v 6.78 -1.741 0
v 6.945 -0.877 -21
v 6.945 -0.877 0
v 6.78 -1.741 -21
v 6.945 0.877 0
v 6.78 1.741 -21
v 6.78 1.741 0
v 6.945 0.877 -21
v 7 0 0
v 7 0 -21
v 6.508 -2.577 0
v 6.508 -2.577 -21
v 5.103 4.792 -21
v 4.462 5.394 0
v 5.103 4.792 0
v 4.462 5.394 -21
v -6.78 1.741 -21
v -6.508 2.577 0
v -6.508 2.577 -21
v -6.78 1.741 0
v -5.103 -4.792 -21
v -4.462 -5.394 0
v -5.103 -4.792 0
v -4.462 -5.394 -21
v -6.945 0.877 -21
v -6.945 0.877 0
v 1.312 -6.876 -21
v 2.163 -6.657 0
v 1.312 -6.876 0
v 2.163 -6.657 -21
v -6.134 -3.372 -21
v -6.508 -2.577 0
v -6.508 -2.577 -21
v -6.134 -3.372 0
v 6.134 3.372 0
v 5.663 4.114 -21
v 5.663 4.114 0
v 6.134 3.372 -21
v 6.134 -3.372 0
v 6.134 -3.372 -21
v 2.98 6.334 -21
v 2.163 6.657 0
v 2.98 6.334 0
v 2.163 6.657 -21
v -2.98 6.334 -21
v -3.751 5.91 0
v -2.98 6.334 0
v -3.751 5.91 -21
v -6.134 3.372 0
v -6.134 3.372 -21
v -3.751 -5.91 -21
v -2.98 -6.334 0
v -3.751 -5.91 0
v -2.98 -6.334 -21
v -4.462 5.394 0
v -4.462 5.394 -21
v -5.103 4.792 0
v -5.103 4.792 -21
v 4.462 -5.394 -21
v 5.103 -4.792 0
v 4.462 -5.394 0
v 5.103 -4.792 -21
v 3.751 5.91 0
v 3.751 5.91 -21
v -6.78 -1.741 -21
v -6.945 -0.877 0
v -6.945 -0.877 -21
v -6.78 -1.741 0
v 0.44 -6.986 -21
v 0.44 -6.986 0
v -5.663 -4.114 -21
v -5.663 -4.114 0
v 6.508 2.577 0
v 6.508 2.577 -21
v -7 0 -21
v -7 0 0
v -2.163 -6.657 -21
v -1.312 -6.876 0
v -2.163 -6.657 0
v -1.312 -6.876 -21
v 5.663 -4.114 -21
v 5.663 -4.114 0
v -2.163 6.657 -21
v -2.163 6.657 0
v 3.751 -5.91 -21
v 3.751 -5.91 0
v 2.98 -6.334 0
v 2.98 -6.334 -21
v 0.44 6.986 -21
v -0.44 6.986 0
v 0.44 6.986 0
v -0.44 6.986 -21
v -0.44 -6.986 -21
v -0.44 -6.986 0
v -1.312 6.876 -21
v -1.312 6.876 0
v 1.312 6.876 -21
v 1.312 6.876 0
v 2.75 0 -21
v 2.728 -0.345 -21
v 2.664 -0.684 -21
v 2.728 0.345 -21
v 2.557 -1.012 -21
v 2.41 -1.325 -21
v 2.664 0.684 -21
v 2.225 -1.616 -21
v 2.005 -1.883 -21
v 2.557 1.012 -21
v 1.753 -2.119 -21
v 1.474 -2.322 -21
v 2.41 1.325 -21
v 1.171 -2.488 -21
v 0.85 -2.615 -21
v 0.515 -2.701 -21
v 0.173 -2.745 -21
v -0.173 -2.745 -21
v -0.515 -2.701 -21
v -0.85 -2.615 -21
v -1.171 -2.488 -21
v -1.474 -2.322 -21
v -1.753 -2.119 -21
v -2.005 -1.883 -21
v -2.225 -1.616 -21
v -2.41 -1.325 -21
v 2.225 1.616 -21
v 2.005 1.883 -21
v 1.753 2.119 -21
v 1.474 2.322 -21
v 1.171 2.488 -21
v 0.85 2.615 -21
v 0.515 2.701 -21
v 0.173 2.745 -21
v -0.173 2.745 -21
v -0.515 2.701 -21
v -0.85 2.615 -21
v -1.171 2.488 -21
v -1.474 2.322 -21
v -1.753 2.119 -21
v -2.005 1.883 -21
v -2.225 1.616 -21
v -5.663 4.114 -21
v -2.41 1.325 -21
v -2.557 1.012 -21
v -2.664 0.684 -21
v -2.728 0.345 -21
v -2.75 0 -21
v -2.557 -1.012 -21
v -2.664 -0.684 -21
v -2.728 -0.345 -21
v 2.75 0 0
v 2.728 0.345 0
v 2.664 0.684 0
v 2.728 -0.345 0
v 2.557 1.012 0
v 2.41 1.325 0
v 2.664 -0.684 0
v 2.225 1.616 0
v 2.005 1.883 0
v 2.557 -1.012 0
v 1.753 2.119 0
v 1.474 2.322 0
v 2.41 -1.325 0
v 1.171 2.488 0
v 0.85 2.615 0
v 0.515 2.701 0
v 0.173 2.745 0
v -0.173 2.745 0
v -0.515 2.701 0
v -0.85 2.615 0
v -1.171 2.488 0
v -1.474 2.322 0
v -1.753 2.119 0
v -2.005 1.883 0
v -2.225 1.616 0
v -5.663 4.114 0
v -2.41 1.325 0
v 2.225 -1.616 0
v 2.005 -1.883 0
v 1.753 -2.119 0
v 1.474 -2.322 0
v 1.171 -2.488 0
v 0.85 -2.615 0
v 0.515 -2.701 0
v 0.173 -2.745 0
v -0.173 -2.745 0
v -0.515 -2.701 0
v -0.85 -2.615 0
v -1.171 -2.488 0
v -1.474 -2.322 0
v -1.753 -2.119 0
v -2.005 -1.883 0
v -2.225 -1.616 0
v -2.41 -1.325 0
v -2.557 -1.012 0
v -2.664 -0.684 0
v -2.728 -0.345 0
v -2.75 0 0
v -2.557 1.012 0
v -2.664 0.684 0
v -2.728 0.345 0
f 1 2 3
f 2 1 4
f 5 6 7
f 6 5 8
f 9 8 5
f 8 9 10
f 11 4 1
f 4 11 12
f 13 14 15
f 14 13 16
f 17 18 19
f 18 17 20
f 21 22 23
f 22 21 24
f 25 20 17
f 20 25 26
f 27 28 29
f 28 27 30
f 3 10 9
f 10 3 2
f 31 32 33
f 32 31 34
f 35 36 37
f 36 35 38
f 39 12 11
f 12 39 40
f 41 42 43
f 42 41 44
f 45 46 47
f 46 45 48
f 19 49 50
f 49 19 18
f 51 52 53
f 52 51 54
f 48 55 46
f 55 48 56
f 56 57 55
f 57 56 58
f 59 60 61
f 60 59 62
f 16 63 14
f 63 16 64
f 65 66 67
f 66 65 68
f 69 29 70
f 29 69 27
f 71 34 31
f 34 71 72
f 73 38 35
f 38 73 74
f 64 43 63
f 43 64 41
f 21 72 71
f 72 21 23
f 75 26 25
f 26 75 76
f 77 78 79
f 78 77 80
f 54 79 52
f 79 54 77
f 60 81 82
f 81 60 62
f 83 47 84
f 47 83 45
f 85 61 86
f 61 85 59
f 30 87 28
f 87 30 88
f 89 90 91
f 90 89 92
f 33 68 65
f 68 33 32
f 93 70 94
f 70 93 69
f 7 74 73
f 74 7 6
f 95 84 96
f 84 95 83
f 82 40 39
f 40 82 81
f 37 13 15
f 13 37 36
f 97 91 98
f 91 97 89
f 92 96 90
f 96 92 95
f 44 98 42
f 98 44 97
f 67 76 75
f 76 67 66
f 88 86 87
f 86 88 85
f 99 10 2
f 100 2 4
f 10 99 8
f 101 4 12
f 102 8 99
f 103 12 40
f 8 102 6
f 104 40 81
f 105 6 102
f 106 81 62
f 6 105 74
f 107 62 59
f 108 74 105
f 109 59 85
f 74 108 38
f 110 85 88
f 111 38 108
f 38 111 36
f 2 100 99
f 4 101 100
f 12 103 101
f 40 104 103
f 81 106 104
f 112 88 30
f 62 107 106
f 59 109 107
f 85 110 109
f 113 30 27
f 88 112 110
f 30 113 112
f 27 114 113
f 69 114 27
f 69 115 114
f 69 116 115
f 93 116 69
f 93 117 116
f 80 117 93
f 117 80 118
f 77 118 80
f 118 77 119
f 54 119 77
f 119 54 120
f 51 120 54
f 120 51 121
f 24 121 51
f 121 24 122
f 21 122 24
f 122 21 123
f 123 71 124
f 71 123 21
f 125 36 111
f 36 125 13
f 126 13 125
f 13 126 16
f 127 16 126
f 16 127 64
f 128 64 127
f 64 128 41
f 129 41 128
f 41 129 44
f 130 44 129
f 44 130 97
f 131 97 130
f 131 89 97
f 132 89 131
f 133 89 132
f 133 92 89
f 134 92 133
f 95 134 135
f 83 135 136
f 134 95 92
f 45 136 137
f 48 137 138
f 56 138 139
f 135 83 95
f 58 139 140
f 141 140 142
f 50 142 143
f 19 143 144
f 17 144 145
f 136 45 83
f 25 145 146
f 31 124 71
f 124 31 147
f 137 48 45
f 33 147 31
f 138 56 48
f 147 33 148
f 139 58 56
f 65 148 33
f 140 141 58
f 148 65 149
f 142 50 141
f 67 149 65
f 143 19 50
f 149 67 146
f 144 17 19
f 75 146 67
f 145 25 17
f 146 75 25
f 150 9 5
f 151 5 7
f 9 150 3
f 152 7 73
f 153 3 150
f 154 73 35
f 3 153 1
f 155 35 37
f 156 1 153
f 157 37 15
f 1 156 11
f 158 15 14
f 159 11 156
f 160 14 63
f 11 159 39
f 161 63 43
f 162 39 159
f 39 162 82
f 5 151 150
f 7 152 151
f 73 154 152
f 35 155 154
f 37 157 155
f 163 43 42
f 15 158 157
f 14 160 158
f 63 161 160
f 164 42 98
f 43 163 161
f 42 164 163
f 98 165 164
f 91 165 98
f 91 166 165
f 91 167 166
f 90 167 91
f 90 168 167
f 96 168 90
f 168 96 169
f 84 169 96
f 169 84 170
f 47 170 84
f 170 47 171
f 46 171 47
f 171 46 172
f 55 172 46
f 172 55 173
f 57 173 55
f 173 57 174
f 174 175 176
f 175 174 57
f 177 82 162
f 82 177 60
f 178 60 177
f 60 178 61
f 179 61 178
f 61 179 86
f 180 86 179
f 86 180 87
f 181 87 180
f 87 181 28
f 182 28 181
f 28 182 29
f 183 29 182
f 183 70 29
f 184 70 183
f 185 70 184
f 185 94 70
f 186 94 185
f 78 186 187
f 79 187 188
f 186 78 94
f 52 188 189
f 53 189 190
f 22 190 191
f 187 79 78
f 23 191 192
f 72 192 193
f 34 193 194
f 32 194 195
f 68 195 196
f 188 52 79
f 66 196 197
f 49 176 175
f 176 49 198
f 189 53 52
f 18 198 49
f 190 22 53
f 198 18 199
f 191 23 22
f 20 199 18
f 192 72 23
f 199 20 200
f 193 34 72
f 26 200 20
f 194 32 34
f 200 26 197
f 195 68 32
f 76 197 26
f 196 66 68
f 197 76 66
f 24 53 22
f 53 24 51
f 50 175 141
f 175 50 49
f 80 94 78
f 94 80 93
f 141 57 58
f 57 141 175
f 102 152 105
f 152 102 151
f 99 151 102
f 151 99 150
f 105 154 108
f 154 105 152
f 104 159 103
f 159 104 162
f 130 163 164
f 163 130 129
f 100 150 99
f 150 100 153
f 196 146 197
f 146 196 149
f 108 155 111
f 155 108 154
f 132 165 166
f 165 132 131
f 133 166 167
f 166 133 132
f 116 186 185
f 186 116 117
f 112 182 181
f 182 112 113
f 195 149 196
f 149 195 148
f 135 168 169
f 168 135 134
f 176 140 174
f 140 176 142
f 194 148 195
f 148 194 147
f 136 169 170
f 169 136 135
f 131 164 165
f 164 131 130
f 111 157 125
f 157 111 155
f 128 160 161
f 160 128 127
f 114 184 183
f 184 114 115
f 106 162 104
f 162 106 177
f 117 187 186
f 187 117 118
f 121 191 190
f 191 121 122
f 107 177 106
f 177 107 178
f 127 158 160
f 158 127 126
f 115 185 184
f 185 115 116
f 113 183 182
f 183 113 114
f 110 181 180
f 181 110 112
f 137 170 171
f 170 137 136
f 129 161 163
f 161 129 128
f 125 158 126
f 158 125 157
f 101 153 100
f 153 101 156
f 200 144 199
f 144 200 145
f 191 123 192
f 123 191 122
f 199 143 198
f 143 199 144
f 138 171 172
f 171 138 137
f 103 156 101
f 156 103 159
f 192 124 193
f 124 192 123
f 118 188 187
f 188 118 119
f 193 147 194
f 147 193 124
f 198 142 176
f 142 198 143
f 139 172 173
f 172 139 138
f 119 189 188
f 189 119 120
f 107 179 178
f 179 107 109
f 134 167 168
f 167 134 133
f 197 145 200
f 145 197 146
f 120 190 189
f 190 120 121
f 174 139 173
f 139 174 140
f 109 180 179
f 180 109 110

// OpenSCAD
$fn = 50;


difference() {
	union() {
		translate(v = [0, 0, -21.0000000000]) {
			cylinder(h = 21, r = 7.0000000000);
		}
		cylinder(h = 0, r = 17.0000000000);
	}
	union() {
		#translate(v = [0, 0, -21]) {
			cylinder(h = 21, r = 2.7500000000);
		}
	}
}
